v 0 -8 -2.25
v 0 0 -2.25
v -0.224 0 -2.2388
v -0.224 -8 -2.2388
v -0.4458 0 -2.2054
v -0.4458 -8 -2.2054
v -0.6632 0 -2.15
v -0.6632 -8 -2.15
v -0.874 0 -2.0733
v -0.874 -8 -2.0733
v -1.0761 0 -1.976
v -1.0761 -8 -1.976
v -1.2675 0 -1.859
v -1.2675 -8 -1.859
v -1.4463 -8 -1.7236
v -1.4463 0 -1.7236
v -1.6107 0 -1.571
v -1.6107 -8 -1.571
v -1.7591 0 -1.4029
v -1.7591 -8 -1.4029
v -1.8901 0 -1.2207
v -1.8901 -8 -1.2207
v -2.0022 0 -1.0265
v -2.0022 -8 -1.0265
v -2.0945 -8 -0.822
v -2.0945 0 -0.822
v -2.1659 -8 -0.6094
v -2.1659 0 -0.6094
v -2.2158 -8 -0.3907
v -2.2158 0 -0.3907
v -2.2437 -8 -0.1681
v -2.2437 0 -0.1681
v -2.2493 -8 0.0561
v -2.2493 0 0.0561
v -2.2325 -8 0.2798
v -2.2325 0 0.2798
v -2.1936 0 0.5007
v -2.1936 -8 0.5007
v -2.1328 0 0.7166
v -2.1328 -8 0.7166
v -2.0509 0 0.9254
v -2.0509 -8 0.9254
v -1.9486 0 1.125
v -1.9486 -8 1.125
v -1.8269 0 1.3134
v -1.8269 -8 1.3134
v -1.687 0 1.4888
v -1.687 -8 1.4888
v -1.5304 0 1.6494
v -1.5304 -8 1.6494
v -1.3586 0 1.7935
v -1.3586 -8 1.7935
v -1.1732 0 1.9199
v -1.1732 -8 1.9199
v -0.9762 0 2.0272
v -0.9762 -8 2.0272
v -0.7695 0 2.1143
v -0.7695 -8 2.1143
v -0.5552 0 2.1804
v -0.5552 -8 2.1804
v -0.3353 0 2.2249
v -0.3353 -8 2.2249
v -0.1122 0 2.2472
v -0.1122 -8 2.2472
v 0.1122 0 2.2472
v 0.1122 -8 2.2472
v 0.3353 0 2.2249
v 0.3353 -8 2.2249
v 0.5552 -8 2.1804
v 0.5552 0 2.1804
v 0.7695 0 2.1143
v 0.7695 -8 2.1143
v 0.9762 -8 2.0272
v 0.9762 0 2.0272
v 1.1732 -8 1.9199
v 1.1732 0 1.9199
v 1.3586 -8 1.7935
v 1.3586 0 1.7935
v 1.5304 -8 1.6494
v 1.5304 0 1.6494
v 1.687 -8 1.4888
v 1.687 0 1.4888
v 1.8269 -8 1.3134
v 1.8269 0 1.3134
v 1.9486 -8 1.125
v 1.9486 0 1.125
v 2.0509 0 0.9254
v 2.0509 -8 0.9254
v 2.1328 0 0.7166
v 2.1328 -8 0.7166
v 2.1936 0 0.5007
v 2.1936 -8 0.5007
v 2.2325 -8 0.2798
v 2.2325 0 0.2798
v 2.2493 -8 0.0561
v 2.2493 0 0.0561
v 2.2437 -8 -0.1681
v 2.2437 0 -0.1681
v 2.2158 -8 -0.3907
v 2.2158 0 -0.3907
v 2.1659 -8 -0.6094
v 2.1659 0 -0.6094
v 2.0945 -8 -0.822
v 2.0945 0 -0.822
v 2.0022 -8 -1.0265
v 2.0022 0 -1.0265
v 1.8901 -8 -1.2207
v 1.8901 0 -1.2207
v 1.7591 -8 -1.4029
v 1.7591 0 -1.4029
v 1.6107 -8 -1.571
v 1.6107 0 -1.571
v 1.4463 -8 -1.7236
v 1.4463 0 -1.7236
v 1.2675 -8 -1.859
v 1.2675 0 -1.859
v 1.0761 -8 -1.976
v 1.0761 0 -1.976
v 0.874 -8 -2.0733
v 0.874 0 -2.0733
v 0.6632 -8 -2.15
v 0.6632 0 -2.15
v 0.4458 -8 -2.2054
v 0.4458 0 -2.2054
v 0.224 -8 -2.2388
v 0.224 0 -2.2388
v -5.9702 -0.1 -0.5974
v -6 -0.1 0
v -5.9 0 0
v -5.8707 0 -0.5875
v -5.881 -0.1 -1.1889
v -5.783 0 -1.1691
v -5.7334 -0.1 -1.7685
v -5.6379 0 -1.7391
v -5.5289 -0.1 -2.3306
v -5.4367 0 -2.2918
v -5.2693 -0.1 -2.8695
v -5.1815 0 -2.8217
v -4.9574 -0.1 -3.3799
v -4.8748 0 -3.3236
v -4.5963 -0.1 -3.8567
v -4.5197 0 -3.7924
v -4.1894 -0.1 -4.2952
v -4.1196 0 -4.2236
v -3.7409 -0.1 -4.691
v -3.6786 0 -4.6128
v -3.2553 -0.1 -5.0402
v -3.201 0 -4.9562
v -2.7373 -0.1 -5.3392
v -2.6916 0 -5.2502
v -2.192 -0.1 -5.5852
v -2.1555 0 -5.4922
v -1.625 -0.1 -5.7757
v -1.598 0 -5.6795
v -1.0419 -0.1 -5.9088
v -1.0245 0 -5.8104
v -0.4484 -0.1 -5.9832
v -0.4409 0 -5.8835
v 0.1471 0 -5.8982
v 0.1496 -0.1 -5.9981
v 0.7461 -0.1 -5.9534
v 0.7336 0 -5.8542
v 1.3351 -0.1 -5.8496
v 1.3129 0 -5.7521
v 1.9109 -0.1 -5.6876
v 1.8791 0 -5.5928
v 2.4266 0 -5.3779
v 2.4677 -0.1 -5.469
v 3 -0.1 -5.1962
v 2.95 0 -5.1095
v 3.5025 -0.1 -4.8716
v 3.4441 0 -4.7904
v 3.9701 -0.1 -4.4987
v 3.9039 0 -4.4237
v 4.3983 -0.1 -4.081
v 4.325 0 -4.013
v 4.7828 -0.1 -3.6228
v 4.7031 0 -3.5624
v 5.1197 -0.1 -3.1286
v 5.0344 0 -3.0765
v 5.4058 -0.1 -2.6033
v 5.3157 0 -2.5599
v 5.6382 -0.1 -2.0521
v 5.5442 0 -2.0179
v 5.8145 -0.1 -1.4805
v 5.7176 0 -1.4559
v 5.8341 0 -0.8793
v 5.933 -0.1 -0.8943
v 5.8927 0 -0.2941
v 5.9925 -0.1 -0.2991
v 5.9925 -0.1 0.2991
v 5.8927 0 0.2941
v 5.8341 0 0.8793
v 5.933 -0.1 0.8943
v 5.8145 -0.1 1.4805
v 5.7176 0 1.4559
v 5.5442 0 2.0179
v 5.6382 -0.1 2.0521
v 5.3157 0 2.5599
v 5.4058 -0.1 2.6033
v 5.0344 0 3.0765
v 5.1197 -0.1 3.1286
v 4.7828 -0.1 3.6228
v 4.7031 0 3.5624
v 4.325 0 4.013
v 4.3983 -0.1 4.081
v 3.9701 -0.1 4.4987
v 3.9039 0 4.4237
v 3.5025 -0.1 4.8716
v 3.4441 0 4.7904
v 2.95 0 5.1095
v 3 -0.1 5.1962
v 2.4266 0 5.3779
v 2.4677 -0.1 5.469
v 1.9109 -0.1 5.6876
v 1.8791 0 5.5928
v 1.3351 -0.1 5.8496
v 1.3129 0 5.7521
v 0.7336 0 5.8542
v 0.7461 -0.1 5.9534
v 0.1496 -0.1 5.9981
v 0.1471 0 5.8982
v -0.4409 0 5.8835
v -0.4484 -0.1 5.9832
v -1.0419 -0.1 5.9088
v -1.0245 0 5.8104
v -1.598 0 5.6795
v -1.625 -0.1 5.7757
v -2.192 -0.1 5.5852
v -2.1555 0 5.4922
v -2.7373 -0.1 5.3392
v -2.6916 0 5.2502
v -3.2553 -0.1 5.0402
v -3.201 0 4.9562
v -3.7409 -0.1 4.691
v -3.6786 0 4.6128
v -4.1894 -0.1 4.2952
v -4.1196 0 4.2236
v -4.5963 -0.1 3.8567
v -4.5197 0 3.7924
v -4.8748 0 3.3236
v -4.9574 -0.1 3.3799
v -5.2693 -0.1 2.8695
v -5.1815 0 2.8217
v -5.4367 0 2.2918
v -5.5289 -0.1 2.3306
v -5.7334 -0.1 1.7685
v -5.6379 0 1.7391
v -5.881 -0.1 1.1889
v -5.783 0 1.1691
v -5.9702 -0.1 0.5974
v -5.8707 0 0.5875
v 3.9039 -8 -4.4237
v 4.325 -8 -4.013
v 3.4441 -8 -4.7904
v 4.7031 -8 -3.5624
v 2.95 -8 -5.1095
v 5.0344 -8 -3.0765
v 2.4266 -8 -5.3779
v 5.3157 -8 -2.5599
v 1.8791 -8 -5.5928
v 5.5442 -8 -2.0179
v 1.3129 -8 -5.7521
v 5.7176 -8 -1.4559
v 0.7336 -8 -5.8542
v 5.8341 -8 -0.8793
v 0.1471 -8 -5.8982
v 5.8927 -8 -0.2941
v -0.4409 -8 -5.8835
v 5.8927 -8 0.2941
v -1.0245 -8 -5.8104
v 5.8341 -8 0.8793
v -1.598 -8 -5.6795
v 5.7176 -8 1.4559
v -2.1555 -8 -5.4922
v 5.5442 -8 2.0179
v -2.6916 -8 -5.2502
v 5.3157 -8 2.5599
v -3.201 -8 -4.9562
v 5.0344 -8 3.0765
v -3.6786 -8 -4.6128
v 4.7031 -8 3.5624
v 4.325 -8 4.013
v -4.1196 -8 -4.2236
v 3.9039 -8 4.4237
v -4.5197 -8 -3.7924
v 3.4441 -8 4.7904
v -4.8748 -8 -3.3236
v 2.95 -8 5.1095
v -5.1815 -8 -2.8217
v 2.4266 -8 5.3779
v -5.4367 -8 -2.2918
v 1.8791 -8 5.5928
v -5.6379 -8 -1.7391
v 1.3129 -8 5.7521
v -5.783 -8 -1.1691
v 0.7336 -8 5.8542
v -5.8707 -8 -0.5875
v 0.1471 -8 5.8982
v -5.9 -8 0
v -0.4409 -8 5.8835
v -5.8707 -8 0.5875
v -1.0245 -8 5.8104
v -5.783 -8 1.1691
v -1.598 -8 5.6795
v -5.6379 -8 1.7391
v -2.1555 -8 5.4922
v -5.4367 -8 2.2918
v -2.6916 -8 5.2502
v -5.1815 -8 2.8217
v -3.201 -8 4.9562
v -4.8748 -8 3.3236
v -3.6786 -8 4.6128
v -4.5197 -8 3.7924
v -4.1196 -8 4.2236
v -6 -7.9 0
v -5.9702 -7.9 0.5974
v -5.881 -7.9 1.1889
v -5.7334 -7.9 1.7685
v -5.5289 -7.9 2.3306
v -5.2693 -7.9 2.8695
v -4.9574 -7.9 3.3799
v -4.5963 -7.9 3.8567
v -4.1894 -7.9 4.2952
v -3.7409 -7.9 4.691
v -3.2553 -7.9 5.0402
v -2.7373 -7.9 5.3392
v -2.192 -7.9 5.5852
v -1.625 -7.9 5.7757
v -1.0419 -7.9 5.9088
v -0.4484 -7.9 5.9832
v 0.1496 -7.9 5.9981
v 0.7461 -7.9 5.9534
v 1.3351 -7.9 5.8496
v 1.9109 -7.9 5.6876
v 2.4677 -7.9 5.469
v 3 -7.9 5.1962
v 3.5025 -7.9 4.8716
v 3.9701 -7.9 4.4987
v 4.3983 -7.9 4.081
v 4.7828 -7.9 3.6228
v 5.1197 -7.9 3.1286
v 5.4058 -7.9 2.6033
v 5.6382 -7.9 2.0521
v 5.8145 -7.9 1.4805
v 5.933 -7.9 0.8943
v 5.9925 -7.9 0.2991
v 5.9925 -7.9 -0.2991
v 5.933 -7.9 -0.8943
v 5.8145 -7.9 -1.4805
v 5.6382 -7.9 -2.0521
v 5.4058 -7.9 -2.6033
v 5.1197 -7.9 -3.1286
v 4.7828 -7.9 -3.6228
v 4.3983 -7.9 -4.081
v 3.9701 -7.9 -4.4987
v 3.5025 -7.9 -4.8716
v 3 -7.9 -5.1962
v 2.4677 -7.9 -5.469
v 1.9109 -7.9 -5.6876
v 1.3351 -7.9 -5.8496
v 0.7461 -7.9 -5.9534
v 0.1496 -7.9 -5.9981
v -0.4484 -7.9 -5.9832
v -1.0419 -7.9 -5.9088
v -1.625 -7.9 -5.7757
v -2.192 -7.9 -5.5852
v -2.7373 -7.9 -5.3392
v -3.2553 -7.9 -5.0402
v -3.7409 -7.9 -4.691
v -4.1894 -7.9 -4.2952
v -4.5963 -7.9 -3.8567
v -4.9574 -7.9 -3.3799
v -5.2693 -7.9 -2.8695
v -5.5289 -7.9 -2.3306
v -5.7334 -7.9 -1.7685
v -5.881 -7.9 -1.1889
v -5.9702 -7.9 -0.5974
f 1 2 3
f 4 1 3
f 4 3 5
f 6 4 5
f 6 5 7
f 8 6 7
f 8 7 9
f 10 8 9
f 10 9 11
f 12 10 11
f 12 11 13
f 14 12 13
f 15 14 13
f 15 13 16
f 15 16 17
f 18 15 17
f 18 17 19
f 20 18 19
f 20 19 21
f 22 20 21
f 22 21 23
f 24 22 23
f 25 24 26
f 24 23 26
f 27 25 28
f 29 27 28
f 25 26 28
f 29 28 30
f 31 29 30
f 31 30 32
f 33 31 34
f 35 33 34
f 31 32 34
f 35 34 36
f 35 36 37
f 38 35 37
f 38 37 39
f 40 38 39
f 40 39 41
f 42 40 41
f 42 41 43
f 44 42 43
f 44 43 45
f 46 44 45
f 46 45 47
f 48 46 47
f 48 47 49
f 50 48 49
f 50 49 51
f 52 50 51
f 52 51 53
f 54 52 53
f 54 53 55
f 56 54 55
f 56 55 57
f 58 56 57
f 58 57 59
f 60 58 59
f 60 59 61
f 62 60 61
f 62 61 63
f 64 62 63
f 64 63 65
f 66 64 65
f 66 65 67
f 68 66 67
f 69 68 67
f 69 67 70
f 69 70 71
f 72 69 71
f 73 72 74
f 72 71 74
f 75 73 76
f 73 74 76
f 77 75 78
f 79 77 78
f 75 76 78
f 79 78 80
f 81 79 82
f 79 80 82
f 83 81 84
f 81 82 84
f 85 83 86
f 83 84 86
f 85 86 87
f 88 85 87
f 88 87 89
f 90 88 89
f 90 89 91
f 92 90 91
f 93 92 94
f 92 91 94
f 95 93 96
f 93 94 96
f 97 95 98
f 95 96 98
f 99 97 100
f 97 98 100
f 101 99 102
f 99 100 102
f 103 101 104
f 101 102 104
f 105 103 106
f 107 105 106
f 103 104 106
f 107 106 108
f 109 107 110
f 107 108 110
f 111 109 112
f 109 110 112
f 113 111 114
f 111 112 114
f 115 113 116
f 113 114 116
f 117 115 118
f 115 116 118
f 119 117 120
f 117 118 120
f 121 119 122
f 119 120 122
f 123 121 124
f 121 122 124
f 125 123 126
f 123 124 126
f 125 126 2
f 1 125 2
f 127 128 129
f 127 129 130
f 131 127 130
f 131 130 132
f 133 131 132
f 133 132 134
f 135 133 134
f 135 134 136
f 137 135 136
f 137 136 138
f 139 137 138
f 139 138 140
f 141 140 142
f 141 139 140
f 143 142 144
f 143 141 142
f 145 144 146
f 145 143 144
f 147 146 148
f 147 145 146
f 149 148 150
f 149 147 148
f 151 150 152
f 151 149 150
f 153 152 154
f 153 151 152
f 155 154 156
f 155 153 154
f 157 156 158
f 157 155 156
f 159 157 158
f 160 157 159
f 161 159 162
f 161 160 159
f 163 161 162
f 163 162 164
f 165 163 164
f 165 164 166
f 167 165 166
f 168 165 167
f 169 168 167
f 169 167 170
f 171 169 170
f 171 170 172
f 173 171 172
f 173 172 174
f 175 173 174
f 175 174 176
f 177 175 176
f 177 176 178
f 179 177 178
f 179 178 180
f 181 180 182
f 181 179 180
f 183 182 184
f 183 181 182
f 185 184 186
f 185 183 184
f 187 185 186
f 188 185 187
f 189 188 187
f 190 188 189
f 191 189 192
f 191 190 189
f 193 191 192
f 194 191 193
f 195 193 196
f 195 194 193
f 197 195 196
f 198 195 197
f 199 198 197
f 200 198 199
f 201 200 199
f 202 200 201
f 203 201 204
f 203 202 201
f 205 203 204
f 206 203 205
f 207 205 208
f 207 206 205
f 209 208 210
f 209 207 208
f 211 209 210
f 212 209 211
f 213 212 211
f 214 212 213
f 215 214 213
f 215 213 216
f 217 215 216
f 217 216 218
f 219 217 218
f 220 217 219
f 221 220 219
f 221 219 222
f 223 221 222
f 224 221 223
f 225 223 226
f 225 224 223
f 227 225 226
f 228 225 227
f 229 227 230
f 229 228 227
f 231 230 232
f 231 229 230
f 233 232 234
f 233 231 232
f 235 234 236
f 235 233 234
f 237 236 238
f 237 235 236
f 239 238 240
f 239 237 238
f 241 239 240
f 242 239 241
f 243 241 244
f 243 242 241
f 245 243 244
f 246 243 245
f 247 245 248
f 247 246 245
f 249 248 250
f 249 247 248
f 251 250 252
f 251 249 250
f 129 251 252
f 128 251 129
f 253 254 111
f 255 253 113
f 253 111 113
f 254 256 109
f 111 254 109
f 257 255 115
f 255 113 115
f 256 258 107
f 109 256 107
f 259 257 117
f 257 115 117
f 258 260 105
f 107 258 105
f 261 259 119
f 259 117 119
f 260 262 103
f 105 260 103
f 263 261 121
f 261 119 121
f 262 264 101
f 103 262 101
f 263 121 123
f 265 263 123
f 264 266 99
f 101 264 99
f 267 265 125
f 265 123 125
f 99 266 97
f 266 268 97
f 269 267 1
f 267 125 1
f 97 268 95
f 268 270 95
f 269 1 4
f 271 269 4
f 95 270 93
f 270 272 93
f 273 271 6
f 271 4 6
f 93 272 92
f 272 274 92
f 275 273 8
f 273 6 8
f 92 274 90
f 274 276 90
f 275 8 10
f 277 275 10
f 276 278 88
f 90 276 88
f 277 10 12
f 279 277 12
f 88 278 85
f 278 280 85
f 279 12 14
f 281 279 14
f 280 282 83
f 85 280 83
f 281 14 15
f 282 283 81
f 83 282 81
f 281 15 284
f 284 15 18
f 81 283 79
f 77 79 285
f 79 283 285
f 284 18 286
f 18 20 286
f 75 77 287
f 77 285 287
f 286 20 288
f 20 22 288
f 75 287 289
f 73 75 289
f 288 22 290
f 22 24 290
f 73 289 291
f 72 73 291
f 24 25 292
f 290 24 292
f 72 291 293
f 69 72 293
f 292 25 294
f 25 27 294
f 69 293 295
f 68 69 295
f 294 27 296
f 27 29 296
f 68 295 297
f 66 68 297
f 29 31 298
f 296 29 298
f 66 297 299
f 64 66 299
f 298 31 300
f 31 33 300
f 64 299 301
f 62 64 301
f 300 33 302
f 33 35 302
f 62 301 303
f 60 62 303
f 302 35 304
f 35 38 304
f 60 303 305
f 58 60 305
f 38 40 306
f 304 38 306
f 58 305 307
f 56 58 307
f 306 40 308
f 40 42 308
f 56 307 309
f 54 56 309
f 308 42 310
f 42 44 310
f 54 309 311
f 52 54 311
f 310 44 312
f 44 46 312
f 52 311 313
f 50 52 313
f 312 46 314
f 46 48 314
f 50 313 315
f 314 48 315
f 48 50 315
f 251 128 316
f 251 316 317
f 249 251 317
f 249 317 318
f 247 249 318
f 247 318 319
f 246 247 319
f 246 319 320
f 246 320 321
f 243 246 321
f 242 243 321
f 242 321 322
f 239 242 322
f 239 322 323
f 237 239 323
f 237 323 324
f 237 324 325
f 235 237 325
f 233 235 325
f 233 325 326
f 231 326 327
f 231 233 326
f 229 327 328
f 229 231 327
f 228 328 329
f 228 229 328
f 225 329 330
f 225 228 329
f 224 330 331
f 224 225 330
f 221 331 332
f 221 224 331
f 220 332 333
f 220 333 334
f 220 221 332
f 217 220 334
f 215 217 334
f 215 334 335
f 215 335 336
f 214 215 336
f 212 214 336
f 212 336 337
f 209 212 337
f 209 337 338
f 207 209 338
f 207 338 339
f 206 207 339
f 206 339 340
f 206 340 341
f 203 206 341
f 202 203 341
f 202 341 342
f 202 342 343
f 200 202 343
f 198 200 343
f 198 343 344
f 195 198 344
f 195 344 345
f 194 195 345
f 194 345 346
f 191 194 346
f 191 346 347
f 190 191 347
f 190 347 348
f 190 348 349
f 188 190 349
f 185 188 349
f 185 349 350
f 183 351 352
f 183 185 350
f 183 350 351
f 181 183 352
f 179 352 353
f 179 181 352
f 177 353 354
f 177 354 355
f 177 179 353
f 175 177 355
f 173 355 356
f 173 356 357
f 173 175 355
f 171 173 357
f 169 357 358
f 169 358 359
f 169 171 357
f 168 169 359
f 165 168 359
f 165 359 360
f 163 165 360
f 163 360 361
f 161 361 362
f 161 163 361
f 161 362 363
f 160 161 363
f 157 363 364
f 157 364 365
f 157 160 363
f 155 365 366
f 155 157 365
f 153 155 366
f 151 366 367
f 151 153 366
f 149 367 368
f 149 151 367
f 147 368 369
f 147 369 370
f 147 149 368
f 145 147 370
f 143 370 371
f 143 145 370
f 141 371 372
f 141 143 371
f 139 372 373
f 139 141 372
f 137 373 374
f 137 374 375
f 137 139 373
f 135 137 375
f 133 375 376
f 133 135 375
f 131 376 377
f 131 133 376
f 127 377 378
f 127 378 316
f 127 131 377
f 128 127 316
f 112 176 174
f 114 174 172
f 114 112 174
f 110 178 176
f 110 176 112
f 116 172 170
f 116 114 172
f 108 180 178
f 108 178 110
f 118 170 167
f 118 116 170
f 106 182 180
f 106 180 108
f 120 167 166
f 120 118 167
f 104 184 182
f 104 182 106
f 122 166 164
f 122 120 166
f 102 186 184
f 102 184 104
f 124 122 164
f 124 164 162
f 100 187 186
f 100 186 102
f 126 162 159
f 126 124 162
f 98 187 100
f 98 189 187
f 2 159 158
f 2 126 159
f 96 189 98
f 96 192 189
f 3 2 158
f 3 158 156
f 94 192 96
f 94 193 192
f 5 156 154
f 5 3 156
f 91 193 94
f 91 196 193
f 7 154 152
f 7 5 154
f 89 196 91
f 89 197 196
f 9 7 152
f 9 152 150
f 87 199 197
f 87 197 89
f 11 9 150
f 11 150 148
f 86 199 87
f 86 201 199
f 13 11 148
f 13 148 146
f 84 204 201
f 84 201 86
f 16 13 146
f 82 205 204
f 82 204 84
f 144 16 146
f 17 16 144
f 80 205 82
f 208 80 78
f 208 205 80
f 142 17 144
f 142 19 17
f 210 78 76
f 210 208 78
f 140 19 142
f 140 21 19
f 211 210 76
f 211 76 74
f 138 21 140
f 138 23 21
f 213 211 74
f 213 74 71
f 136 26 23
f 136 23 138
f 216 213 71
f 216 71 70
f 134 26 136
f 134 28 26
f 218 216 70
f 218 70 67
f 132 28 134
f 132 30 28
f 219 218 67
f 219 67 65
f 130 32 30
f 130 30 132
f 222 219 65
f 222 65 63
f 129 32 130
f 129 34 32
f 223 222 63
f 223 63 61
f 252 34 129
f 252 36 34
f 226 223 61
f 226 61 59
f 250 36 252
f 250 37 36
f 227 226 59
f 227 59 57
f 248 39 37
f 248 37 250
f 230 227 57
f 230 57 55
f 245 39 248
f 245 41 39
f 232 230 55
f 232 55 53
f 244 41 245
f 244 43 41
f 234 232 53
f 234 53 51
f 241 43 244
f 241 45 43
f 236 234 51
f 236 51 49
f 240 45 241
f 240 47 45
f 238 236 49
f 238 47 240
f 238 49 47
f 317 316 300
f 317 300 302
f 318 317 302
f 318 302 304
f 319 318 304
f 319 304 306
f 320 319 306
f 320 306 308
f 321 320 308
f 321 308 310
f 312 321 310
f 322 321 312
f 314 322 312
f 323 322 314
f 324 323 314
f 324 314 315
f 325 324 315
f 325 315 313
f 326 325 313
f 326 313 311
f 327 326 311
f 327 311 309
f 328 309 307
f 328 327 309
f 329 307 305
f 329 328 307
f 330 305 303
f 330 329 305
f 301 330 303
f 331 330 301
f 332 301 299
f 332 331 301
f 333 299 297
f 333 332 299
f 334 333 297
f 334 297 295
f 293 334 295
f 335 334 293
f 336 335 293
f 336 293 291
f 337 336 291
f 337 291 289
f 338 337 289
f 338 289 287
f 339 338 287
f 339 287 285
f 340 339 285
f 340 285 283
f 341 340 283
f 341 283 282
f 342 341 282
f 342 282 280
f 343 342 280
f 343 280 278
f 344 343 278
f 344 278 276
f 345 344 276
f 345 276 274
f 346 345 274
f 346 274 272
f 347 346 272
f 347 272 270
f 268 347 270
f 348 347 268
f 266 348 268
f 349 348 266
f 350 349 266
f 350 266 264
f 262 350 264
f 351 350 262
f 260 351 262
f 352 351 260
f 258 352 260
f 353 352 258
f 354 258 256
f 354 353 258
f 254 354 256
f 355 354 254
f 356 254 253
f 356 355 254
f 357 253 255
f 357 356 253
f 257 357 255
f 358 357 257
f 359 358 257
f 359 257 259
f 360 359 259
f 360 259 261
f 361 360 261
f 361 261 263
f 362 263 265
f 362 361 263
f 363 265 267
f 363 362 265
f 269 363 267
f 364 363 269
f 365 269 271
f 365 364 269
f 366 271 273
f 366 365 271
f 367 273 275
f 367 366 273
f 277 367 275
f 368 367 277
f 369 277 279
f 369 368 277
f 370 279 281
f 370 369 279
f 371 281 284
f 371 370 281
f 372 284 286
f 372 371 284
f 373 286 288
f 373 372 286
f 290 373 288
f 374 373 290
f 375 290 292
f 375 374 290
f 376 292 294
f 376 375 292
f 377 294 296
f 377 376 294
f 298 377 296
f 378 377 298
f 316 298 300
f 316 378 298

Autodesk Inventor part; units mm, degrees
ref_plane "YZ Plane" through (0, 0, 0) normal (1, 0, 0) x (0, 1, 0)
ref_plane "XZ Plane" through (0, 0, 0) normal (0, 1, 0) x (-1, 0, 0)
ref_plane "XY Plane" through (0, 0, 0) normal (0, 0, 1) x (1, 0, 0)
sketch "Sketch1" plane through (0, 0, 0) normal (0, 1, 0) x (-1, 0, 0)
  circle A0 centre (0, 0) radius 6
  dimension "d0" = 12
extrude "Extrusion1" add sketch "Sketch1" against normal blind 8
chamfer "Chamfer1" distance 0.1 angle 45 2 edges at (6, -8, 0) (6, 0, 0)
sketch "Sketch2" plane through (0, -8, 0) normal (0, -1, 0) x (1, 0, 0)
  point P0 (0, 0)
hole "Hole1" at (0, -8, 0) direction (0, 1, 0) diameter 4.5 end through all
properties part number "13-0004" material "Polystyrene, High Impact"
